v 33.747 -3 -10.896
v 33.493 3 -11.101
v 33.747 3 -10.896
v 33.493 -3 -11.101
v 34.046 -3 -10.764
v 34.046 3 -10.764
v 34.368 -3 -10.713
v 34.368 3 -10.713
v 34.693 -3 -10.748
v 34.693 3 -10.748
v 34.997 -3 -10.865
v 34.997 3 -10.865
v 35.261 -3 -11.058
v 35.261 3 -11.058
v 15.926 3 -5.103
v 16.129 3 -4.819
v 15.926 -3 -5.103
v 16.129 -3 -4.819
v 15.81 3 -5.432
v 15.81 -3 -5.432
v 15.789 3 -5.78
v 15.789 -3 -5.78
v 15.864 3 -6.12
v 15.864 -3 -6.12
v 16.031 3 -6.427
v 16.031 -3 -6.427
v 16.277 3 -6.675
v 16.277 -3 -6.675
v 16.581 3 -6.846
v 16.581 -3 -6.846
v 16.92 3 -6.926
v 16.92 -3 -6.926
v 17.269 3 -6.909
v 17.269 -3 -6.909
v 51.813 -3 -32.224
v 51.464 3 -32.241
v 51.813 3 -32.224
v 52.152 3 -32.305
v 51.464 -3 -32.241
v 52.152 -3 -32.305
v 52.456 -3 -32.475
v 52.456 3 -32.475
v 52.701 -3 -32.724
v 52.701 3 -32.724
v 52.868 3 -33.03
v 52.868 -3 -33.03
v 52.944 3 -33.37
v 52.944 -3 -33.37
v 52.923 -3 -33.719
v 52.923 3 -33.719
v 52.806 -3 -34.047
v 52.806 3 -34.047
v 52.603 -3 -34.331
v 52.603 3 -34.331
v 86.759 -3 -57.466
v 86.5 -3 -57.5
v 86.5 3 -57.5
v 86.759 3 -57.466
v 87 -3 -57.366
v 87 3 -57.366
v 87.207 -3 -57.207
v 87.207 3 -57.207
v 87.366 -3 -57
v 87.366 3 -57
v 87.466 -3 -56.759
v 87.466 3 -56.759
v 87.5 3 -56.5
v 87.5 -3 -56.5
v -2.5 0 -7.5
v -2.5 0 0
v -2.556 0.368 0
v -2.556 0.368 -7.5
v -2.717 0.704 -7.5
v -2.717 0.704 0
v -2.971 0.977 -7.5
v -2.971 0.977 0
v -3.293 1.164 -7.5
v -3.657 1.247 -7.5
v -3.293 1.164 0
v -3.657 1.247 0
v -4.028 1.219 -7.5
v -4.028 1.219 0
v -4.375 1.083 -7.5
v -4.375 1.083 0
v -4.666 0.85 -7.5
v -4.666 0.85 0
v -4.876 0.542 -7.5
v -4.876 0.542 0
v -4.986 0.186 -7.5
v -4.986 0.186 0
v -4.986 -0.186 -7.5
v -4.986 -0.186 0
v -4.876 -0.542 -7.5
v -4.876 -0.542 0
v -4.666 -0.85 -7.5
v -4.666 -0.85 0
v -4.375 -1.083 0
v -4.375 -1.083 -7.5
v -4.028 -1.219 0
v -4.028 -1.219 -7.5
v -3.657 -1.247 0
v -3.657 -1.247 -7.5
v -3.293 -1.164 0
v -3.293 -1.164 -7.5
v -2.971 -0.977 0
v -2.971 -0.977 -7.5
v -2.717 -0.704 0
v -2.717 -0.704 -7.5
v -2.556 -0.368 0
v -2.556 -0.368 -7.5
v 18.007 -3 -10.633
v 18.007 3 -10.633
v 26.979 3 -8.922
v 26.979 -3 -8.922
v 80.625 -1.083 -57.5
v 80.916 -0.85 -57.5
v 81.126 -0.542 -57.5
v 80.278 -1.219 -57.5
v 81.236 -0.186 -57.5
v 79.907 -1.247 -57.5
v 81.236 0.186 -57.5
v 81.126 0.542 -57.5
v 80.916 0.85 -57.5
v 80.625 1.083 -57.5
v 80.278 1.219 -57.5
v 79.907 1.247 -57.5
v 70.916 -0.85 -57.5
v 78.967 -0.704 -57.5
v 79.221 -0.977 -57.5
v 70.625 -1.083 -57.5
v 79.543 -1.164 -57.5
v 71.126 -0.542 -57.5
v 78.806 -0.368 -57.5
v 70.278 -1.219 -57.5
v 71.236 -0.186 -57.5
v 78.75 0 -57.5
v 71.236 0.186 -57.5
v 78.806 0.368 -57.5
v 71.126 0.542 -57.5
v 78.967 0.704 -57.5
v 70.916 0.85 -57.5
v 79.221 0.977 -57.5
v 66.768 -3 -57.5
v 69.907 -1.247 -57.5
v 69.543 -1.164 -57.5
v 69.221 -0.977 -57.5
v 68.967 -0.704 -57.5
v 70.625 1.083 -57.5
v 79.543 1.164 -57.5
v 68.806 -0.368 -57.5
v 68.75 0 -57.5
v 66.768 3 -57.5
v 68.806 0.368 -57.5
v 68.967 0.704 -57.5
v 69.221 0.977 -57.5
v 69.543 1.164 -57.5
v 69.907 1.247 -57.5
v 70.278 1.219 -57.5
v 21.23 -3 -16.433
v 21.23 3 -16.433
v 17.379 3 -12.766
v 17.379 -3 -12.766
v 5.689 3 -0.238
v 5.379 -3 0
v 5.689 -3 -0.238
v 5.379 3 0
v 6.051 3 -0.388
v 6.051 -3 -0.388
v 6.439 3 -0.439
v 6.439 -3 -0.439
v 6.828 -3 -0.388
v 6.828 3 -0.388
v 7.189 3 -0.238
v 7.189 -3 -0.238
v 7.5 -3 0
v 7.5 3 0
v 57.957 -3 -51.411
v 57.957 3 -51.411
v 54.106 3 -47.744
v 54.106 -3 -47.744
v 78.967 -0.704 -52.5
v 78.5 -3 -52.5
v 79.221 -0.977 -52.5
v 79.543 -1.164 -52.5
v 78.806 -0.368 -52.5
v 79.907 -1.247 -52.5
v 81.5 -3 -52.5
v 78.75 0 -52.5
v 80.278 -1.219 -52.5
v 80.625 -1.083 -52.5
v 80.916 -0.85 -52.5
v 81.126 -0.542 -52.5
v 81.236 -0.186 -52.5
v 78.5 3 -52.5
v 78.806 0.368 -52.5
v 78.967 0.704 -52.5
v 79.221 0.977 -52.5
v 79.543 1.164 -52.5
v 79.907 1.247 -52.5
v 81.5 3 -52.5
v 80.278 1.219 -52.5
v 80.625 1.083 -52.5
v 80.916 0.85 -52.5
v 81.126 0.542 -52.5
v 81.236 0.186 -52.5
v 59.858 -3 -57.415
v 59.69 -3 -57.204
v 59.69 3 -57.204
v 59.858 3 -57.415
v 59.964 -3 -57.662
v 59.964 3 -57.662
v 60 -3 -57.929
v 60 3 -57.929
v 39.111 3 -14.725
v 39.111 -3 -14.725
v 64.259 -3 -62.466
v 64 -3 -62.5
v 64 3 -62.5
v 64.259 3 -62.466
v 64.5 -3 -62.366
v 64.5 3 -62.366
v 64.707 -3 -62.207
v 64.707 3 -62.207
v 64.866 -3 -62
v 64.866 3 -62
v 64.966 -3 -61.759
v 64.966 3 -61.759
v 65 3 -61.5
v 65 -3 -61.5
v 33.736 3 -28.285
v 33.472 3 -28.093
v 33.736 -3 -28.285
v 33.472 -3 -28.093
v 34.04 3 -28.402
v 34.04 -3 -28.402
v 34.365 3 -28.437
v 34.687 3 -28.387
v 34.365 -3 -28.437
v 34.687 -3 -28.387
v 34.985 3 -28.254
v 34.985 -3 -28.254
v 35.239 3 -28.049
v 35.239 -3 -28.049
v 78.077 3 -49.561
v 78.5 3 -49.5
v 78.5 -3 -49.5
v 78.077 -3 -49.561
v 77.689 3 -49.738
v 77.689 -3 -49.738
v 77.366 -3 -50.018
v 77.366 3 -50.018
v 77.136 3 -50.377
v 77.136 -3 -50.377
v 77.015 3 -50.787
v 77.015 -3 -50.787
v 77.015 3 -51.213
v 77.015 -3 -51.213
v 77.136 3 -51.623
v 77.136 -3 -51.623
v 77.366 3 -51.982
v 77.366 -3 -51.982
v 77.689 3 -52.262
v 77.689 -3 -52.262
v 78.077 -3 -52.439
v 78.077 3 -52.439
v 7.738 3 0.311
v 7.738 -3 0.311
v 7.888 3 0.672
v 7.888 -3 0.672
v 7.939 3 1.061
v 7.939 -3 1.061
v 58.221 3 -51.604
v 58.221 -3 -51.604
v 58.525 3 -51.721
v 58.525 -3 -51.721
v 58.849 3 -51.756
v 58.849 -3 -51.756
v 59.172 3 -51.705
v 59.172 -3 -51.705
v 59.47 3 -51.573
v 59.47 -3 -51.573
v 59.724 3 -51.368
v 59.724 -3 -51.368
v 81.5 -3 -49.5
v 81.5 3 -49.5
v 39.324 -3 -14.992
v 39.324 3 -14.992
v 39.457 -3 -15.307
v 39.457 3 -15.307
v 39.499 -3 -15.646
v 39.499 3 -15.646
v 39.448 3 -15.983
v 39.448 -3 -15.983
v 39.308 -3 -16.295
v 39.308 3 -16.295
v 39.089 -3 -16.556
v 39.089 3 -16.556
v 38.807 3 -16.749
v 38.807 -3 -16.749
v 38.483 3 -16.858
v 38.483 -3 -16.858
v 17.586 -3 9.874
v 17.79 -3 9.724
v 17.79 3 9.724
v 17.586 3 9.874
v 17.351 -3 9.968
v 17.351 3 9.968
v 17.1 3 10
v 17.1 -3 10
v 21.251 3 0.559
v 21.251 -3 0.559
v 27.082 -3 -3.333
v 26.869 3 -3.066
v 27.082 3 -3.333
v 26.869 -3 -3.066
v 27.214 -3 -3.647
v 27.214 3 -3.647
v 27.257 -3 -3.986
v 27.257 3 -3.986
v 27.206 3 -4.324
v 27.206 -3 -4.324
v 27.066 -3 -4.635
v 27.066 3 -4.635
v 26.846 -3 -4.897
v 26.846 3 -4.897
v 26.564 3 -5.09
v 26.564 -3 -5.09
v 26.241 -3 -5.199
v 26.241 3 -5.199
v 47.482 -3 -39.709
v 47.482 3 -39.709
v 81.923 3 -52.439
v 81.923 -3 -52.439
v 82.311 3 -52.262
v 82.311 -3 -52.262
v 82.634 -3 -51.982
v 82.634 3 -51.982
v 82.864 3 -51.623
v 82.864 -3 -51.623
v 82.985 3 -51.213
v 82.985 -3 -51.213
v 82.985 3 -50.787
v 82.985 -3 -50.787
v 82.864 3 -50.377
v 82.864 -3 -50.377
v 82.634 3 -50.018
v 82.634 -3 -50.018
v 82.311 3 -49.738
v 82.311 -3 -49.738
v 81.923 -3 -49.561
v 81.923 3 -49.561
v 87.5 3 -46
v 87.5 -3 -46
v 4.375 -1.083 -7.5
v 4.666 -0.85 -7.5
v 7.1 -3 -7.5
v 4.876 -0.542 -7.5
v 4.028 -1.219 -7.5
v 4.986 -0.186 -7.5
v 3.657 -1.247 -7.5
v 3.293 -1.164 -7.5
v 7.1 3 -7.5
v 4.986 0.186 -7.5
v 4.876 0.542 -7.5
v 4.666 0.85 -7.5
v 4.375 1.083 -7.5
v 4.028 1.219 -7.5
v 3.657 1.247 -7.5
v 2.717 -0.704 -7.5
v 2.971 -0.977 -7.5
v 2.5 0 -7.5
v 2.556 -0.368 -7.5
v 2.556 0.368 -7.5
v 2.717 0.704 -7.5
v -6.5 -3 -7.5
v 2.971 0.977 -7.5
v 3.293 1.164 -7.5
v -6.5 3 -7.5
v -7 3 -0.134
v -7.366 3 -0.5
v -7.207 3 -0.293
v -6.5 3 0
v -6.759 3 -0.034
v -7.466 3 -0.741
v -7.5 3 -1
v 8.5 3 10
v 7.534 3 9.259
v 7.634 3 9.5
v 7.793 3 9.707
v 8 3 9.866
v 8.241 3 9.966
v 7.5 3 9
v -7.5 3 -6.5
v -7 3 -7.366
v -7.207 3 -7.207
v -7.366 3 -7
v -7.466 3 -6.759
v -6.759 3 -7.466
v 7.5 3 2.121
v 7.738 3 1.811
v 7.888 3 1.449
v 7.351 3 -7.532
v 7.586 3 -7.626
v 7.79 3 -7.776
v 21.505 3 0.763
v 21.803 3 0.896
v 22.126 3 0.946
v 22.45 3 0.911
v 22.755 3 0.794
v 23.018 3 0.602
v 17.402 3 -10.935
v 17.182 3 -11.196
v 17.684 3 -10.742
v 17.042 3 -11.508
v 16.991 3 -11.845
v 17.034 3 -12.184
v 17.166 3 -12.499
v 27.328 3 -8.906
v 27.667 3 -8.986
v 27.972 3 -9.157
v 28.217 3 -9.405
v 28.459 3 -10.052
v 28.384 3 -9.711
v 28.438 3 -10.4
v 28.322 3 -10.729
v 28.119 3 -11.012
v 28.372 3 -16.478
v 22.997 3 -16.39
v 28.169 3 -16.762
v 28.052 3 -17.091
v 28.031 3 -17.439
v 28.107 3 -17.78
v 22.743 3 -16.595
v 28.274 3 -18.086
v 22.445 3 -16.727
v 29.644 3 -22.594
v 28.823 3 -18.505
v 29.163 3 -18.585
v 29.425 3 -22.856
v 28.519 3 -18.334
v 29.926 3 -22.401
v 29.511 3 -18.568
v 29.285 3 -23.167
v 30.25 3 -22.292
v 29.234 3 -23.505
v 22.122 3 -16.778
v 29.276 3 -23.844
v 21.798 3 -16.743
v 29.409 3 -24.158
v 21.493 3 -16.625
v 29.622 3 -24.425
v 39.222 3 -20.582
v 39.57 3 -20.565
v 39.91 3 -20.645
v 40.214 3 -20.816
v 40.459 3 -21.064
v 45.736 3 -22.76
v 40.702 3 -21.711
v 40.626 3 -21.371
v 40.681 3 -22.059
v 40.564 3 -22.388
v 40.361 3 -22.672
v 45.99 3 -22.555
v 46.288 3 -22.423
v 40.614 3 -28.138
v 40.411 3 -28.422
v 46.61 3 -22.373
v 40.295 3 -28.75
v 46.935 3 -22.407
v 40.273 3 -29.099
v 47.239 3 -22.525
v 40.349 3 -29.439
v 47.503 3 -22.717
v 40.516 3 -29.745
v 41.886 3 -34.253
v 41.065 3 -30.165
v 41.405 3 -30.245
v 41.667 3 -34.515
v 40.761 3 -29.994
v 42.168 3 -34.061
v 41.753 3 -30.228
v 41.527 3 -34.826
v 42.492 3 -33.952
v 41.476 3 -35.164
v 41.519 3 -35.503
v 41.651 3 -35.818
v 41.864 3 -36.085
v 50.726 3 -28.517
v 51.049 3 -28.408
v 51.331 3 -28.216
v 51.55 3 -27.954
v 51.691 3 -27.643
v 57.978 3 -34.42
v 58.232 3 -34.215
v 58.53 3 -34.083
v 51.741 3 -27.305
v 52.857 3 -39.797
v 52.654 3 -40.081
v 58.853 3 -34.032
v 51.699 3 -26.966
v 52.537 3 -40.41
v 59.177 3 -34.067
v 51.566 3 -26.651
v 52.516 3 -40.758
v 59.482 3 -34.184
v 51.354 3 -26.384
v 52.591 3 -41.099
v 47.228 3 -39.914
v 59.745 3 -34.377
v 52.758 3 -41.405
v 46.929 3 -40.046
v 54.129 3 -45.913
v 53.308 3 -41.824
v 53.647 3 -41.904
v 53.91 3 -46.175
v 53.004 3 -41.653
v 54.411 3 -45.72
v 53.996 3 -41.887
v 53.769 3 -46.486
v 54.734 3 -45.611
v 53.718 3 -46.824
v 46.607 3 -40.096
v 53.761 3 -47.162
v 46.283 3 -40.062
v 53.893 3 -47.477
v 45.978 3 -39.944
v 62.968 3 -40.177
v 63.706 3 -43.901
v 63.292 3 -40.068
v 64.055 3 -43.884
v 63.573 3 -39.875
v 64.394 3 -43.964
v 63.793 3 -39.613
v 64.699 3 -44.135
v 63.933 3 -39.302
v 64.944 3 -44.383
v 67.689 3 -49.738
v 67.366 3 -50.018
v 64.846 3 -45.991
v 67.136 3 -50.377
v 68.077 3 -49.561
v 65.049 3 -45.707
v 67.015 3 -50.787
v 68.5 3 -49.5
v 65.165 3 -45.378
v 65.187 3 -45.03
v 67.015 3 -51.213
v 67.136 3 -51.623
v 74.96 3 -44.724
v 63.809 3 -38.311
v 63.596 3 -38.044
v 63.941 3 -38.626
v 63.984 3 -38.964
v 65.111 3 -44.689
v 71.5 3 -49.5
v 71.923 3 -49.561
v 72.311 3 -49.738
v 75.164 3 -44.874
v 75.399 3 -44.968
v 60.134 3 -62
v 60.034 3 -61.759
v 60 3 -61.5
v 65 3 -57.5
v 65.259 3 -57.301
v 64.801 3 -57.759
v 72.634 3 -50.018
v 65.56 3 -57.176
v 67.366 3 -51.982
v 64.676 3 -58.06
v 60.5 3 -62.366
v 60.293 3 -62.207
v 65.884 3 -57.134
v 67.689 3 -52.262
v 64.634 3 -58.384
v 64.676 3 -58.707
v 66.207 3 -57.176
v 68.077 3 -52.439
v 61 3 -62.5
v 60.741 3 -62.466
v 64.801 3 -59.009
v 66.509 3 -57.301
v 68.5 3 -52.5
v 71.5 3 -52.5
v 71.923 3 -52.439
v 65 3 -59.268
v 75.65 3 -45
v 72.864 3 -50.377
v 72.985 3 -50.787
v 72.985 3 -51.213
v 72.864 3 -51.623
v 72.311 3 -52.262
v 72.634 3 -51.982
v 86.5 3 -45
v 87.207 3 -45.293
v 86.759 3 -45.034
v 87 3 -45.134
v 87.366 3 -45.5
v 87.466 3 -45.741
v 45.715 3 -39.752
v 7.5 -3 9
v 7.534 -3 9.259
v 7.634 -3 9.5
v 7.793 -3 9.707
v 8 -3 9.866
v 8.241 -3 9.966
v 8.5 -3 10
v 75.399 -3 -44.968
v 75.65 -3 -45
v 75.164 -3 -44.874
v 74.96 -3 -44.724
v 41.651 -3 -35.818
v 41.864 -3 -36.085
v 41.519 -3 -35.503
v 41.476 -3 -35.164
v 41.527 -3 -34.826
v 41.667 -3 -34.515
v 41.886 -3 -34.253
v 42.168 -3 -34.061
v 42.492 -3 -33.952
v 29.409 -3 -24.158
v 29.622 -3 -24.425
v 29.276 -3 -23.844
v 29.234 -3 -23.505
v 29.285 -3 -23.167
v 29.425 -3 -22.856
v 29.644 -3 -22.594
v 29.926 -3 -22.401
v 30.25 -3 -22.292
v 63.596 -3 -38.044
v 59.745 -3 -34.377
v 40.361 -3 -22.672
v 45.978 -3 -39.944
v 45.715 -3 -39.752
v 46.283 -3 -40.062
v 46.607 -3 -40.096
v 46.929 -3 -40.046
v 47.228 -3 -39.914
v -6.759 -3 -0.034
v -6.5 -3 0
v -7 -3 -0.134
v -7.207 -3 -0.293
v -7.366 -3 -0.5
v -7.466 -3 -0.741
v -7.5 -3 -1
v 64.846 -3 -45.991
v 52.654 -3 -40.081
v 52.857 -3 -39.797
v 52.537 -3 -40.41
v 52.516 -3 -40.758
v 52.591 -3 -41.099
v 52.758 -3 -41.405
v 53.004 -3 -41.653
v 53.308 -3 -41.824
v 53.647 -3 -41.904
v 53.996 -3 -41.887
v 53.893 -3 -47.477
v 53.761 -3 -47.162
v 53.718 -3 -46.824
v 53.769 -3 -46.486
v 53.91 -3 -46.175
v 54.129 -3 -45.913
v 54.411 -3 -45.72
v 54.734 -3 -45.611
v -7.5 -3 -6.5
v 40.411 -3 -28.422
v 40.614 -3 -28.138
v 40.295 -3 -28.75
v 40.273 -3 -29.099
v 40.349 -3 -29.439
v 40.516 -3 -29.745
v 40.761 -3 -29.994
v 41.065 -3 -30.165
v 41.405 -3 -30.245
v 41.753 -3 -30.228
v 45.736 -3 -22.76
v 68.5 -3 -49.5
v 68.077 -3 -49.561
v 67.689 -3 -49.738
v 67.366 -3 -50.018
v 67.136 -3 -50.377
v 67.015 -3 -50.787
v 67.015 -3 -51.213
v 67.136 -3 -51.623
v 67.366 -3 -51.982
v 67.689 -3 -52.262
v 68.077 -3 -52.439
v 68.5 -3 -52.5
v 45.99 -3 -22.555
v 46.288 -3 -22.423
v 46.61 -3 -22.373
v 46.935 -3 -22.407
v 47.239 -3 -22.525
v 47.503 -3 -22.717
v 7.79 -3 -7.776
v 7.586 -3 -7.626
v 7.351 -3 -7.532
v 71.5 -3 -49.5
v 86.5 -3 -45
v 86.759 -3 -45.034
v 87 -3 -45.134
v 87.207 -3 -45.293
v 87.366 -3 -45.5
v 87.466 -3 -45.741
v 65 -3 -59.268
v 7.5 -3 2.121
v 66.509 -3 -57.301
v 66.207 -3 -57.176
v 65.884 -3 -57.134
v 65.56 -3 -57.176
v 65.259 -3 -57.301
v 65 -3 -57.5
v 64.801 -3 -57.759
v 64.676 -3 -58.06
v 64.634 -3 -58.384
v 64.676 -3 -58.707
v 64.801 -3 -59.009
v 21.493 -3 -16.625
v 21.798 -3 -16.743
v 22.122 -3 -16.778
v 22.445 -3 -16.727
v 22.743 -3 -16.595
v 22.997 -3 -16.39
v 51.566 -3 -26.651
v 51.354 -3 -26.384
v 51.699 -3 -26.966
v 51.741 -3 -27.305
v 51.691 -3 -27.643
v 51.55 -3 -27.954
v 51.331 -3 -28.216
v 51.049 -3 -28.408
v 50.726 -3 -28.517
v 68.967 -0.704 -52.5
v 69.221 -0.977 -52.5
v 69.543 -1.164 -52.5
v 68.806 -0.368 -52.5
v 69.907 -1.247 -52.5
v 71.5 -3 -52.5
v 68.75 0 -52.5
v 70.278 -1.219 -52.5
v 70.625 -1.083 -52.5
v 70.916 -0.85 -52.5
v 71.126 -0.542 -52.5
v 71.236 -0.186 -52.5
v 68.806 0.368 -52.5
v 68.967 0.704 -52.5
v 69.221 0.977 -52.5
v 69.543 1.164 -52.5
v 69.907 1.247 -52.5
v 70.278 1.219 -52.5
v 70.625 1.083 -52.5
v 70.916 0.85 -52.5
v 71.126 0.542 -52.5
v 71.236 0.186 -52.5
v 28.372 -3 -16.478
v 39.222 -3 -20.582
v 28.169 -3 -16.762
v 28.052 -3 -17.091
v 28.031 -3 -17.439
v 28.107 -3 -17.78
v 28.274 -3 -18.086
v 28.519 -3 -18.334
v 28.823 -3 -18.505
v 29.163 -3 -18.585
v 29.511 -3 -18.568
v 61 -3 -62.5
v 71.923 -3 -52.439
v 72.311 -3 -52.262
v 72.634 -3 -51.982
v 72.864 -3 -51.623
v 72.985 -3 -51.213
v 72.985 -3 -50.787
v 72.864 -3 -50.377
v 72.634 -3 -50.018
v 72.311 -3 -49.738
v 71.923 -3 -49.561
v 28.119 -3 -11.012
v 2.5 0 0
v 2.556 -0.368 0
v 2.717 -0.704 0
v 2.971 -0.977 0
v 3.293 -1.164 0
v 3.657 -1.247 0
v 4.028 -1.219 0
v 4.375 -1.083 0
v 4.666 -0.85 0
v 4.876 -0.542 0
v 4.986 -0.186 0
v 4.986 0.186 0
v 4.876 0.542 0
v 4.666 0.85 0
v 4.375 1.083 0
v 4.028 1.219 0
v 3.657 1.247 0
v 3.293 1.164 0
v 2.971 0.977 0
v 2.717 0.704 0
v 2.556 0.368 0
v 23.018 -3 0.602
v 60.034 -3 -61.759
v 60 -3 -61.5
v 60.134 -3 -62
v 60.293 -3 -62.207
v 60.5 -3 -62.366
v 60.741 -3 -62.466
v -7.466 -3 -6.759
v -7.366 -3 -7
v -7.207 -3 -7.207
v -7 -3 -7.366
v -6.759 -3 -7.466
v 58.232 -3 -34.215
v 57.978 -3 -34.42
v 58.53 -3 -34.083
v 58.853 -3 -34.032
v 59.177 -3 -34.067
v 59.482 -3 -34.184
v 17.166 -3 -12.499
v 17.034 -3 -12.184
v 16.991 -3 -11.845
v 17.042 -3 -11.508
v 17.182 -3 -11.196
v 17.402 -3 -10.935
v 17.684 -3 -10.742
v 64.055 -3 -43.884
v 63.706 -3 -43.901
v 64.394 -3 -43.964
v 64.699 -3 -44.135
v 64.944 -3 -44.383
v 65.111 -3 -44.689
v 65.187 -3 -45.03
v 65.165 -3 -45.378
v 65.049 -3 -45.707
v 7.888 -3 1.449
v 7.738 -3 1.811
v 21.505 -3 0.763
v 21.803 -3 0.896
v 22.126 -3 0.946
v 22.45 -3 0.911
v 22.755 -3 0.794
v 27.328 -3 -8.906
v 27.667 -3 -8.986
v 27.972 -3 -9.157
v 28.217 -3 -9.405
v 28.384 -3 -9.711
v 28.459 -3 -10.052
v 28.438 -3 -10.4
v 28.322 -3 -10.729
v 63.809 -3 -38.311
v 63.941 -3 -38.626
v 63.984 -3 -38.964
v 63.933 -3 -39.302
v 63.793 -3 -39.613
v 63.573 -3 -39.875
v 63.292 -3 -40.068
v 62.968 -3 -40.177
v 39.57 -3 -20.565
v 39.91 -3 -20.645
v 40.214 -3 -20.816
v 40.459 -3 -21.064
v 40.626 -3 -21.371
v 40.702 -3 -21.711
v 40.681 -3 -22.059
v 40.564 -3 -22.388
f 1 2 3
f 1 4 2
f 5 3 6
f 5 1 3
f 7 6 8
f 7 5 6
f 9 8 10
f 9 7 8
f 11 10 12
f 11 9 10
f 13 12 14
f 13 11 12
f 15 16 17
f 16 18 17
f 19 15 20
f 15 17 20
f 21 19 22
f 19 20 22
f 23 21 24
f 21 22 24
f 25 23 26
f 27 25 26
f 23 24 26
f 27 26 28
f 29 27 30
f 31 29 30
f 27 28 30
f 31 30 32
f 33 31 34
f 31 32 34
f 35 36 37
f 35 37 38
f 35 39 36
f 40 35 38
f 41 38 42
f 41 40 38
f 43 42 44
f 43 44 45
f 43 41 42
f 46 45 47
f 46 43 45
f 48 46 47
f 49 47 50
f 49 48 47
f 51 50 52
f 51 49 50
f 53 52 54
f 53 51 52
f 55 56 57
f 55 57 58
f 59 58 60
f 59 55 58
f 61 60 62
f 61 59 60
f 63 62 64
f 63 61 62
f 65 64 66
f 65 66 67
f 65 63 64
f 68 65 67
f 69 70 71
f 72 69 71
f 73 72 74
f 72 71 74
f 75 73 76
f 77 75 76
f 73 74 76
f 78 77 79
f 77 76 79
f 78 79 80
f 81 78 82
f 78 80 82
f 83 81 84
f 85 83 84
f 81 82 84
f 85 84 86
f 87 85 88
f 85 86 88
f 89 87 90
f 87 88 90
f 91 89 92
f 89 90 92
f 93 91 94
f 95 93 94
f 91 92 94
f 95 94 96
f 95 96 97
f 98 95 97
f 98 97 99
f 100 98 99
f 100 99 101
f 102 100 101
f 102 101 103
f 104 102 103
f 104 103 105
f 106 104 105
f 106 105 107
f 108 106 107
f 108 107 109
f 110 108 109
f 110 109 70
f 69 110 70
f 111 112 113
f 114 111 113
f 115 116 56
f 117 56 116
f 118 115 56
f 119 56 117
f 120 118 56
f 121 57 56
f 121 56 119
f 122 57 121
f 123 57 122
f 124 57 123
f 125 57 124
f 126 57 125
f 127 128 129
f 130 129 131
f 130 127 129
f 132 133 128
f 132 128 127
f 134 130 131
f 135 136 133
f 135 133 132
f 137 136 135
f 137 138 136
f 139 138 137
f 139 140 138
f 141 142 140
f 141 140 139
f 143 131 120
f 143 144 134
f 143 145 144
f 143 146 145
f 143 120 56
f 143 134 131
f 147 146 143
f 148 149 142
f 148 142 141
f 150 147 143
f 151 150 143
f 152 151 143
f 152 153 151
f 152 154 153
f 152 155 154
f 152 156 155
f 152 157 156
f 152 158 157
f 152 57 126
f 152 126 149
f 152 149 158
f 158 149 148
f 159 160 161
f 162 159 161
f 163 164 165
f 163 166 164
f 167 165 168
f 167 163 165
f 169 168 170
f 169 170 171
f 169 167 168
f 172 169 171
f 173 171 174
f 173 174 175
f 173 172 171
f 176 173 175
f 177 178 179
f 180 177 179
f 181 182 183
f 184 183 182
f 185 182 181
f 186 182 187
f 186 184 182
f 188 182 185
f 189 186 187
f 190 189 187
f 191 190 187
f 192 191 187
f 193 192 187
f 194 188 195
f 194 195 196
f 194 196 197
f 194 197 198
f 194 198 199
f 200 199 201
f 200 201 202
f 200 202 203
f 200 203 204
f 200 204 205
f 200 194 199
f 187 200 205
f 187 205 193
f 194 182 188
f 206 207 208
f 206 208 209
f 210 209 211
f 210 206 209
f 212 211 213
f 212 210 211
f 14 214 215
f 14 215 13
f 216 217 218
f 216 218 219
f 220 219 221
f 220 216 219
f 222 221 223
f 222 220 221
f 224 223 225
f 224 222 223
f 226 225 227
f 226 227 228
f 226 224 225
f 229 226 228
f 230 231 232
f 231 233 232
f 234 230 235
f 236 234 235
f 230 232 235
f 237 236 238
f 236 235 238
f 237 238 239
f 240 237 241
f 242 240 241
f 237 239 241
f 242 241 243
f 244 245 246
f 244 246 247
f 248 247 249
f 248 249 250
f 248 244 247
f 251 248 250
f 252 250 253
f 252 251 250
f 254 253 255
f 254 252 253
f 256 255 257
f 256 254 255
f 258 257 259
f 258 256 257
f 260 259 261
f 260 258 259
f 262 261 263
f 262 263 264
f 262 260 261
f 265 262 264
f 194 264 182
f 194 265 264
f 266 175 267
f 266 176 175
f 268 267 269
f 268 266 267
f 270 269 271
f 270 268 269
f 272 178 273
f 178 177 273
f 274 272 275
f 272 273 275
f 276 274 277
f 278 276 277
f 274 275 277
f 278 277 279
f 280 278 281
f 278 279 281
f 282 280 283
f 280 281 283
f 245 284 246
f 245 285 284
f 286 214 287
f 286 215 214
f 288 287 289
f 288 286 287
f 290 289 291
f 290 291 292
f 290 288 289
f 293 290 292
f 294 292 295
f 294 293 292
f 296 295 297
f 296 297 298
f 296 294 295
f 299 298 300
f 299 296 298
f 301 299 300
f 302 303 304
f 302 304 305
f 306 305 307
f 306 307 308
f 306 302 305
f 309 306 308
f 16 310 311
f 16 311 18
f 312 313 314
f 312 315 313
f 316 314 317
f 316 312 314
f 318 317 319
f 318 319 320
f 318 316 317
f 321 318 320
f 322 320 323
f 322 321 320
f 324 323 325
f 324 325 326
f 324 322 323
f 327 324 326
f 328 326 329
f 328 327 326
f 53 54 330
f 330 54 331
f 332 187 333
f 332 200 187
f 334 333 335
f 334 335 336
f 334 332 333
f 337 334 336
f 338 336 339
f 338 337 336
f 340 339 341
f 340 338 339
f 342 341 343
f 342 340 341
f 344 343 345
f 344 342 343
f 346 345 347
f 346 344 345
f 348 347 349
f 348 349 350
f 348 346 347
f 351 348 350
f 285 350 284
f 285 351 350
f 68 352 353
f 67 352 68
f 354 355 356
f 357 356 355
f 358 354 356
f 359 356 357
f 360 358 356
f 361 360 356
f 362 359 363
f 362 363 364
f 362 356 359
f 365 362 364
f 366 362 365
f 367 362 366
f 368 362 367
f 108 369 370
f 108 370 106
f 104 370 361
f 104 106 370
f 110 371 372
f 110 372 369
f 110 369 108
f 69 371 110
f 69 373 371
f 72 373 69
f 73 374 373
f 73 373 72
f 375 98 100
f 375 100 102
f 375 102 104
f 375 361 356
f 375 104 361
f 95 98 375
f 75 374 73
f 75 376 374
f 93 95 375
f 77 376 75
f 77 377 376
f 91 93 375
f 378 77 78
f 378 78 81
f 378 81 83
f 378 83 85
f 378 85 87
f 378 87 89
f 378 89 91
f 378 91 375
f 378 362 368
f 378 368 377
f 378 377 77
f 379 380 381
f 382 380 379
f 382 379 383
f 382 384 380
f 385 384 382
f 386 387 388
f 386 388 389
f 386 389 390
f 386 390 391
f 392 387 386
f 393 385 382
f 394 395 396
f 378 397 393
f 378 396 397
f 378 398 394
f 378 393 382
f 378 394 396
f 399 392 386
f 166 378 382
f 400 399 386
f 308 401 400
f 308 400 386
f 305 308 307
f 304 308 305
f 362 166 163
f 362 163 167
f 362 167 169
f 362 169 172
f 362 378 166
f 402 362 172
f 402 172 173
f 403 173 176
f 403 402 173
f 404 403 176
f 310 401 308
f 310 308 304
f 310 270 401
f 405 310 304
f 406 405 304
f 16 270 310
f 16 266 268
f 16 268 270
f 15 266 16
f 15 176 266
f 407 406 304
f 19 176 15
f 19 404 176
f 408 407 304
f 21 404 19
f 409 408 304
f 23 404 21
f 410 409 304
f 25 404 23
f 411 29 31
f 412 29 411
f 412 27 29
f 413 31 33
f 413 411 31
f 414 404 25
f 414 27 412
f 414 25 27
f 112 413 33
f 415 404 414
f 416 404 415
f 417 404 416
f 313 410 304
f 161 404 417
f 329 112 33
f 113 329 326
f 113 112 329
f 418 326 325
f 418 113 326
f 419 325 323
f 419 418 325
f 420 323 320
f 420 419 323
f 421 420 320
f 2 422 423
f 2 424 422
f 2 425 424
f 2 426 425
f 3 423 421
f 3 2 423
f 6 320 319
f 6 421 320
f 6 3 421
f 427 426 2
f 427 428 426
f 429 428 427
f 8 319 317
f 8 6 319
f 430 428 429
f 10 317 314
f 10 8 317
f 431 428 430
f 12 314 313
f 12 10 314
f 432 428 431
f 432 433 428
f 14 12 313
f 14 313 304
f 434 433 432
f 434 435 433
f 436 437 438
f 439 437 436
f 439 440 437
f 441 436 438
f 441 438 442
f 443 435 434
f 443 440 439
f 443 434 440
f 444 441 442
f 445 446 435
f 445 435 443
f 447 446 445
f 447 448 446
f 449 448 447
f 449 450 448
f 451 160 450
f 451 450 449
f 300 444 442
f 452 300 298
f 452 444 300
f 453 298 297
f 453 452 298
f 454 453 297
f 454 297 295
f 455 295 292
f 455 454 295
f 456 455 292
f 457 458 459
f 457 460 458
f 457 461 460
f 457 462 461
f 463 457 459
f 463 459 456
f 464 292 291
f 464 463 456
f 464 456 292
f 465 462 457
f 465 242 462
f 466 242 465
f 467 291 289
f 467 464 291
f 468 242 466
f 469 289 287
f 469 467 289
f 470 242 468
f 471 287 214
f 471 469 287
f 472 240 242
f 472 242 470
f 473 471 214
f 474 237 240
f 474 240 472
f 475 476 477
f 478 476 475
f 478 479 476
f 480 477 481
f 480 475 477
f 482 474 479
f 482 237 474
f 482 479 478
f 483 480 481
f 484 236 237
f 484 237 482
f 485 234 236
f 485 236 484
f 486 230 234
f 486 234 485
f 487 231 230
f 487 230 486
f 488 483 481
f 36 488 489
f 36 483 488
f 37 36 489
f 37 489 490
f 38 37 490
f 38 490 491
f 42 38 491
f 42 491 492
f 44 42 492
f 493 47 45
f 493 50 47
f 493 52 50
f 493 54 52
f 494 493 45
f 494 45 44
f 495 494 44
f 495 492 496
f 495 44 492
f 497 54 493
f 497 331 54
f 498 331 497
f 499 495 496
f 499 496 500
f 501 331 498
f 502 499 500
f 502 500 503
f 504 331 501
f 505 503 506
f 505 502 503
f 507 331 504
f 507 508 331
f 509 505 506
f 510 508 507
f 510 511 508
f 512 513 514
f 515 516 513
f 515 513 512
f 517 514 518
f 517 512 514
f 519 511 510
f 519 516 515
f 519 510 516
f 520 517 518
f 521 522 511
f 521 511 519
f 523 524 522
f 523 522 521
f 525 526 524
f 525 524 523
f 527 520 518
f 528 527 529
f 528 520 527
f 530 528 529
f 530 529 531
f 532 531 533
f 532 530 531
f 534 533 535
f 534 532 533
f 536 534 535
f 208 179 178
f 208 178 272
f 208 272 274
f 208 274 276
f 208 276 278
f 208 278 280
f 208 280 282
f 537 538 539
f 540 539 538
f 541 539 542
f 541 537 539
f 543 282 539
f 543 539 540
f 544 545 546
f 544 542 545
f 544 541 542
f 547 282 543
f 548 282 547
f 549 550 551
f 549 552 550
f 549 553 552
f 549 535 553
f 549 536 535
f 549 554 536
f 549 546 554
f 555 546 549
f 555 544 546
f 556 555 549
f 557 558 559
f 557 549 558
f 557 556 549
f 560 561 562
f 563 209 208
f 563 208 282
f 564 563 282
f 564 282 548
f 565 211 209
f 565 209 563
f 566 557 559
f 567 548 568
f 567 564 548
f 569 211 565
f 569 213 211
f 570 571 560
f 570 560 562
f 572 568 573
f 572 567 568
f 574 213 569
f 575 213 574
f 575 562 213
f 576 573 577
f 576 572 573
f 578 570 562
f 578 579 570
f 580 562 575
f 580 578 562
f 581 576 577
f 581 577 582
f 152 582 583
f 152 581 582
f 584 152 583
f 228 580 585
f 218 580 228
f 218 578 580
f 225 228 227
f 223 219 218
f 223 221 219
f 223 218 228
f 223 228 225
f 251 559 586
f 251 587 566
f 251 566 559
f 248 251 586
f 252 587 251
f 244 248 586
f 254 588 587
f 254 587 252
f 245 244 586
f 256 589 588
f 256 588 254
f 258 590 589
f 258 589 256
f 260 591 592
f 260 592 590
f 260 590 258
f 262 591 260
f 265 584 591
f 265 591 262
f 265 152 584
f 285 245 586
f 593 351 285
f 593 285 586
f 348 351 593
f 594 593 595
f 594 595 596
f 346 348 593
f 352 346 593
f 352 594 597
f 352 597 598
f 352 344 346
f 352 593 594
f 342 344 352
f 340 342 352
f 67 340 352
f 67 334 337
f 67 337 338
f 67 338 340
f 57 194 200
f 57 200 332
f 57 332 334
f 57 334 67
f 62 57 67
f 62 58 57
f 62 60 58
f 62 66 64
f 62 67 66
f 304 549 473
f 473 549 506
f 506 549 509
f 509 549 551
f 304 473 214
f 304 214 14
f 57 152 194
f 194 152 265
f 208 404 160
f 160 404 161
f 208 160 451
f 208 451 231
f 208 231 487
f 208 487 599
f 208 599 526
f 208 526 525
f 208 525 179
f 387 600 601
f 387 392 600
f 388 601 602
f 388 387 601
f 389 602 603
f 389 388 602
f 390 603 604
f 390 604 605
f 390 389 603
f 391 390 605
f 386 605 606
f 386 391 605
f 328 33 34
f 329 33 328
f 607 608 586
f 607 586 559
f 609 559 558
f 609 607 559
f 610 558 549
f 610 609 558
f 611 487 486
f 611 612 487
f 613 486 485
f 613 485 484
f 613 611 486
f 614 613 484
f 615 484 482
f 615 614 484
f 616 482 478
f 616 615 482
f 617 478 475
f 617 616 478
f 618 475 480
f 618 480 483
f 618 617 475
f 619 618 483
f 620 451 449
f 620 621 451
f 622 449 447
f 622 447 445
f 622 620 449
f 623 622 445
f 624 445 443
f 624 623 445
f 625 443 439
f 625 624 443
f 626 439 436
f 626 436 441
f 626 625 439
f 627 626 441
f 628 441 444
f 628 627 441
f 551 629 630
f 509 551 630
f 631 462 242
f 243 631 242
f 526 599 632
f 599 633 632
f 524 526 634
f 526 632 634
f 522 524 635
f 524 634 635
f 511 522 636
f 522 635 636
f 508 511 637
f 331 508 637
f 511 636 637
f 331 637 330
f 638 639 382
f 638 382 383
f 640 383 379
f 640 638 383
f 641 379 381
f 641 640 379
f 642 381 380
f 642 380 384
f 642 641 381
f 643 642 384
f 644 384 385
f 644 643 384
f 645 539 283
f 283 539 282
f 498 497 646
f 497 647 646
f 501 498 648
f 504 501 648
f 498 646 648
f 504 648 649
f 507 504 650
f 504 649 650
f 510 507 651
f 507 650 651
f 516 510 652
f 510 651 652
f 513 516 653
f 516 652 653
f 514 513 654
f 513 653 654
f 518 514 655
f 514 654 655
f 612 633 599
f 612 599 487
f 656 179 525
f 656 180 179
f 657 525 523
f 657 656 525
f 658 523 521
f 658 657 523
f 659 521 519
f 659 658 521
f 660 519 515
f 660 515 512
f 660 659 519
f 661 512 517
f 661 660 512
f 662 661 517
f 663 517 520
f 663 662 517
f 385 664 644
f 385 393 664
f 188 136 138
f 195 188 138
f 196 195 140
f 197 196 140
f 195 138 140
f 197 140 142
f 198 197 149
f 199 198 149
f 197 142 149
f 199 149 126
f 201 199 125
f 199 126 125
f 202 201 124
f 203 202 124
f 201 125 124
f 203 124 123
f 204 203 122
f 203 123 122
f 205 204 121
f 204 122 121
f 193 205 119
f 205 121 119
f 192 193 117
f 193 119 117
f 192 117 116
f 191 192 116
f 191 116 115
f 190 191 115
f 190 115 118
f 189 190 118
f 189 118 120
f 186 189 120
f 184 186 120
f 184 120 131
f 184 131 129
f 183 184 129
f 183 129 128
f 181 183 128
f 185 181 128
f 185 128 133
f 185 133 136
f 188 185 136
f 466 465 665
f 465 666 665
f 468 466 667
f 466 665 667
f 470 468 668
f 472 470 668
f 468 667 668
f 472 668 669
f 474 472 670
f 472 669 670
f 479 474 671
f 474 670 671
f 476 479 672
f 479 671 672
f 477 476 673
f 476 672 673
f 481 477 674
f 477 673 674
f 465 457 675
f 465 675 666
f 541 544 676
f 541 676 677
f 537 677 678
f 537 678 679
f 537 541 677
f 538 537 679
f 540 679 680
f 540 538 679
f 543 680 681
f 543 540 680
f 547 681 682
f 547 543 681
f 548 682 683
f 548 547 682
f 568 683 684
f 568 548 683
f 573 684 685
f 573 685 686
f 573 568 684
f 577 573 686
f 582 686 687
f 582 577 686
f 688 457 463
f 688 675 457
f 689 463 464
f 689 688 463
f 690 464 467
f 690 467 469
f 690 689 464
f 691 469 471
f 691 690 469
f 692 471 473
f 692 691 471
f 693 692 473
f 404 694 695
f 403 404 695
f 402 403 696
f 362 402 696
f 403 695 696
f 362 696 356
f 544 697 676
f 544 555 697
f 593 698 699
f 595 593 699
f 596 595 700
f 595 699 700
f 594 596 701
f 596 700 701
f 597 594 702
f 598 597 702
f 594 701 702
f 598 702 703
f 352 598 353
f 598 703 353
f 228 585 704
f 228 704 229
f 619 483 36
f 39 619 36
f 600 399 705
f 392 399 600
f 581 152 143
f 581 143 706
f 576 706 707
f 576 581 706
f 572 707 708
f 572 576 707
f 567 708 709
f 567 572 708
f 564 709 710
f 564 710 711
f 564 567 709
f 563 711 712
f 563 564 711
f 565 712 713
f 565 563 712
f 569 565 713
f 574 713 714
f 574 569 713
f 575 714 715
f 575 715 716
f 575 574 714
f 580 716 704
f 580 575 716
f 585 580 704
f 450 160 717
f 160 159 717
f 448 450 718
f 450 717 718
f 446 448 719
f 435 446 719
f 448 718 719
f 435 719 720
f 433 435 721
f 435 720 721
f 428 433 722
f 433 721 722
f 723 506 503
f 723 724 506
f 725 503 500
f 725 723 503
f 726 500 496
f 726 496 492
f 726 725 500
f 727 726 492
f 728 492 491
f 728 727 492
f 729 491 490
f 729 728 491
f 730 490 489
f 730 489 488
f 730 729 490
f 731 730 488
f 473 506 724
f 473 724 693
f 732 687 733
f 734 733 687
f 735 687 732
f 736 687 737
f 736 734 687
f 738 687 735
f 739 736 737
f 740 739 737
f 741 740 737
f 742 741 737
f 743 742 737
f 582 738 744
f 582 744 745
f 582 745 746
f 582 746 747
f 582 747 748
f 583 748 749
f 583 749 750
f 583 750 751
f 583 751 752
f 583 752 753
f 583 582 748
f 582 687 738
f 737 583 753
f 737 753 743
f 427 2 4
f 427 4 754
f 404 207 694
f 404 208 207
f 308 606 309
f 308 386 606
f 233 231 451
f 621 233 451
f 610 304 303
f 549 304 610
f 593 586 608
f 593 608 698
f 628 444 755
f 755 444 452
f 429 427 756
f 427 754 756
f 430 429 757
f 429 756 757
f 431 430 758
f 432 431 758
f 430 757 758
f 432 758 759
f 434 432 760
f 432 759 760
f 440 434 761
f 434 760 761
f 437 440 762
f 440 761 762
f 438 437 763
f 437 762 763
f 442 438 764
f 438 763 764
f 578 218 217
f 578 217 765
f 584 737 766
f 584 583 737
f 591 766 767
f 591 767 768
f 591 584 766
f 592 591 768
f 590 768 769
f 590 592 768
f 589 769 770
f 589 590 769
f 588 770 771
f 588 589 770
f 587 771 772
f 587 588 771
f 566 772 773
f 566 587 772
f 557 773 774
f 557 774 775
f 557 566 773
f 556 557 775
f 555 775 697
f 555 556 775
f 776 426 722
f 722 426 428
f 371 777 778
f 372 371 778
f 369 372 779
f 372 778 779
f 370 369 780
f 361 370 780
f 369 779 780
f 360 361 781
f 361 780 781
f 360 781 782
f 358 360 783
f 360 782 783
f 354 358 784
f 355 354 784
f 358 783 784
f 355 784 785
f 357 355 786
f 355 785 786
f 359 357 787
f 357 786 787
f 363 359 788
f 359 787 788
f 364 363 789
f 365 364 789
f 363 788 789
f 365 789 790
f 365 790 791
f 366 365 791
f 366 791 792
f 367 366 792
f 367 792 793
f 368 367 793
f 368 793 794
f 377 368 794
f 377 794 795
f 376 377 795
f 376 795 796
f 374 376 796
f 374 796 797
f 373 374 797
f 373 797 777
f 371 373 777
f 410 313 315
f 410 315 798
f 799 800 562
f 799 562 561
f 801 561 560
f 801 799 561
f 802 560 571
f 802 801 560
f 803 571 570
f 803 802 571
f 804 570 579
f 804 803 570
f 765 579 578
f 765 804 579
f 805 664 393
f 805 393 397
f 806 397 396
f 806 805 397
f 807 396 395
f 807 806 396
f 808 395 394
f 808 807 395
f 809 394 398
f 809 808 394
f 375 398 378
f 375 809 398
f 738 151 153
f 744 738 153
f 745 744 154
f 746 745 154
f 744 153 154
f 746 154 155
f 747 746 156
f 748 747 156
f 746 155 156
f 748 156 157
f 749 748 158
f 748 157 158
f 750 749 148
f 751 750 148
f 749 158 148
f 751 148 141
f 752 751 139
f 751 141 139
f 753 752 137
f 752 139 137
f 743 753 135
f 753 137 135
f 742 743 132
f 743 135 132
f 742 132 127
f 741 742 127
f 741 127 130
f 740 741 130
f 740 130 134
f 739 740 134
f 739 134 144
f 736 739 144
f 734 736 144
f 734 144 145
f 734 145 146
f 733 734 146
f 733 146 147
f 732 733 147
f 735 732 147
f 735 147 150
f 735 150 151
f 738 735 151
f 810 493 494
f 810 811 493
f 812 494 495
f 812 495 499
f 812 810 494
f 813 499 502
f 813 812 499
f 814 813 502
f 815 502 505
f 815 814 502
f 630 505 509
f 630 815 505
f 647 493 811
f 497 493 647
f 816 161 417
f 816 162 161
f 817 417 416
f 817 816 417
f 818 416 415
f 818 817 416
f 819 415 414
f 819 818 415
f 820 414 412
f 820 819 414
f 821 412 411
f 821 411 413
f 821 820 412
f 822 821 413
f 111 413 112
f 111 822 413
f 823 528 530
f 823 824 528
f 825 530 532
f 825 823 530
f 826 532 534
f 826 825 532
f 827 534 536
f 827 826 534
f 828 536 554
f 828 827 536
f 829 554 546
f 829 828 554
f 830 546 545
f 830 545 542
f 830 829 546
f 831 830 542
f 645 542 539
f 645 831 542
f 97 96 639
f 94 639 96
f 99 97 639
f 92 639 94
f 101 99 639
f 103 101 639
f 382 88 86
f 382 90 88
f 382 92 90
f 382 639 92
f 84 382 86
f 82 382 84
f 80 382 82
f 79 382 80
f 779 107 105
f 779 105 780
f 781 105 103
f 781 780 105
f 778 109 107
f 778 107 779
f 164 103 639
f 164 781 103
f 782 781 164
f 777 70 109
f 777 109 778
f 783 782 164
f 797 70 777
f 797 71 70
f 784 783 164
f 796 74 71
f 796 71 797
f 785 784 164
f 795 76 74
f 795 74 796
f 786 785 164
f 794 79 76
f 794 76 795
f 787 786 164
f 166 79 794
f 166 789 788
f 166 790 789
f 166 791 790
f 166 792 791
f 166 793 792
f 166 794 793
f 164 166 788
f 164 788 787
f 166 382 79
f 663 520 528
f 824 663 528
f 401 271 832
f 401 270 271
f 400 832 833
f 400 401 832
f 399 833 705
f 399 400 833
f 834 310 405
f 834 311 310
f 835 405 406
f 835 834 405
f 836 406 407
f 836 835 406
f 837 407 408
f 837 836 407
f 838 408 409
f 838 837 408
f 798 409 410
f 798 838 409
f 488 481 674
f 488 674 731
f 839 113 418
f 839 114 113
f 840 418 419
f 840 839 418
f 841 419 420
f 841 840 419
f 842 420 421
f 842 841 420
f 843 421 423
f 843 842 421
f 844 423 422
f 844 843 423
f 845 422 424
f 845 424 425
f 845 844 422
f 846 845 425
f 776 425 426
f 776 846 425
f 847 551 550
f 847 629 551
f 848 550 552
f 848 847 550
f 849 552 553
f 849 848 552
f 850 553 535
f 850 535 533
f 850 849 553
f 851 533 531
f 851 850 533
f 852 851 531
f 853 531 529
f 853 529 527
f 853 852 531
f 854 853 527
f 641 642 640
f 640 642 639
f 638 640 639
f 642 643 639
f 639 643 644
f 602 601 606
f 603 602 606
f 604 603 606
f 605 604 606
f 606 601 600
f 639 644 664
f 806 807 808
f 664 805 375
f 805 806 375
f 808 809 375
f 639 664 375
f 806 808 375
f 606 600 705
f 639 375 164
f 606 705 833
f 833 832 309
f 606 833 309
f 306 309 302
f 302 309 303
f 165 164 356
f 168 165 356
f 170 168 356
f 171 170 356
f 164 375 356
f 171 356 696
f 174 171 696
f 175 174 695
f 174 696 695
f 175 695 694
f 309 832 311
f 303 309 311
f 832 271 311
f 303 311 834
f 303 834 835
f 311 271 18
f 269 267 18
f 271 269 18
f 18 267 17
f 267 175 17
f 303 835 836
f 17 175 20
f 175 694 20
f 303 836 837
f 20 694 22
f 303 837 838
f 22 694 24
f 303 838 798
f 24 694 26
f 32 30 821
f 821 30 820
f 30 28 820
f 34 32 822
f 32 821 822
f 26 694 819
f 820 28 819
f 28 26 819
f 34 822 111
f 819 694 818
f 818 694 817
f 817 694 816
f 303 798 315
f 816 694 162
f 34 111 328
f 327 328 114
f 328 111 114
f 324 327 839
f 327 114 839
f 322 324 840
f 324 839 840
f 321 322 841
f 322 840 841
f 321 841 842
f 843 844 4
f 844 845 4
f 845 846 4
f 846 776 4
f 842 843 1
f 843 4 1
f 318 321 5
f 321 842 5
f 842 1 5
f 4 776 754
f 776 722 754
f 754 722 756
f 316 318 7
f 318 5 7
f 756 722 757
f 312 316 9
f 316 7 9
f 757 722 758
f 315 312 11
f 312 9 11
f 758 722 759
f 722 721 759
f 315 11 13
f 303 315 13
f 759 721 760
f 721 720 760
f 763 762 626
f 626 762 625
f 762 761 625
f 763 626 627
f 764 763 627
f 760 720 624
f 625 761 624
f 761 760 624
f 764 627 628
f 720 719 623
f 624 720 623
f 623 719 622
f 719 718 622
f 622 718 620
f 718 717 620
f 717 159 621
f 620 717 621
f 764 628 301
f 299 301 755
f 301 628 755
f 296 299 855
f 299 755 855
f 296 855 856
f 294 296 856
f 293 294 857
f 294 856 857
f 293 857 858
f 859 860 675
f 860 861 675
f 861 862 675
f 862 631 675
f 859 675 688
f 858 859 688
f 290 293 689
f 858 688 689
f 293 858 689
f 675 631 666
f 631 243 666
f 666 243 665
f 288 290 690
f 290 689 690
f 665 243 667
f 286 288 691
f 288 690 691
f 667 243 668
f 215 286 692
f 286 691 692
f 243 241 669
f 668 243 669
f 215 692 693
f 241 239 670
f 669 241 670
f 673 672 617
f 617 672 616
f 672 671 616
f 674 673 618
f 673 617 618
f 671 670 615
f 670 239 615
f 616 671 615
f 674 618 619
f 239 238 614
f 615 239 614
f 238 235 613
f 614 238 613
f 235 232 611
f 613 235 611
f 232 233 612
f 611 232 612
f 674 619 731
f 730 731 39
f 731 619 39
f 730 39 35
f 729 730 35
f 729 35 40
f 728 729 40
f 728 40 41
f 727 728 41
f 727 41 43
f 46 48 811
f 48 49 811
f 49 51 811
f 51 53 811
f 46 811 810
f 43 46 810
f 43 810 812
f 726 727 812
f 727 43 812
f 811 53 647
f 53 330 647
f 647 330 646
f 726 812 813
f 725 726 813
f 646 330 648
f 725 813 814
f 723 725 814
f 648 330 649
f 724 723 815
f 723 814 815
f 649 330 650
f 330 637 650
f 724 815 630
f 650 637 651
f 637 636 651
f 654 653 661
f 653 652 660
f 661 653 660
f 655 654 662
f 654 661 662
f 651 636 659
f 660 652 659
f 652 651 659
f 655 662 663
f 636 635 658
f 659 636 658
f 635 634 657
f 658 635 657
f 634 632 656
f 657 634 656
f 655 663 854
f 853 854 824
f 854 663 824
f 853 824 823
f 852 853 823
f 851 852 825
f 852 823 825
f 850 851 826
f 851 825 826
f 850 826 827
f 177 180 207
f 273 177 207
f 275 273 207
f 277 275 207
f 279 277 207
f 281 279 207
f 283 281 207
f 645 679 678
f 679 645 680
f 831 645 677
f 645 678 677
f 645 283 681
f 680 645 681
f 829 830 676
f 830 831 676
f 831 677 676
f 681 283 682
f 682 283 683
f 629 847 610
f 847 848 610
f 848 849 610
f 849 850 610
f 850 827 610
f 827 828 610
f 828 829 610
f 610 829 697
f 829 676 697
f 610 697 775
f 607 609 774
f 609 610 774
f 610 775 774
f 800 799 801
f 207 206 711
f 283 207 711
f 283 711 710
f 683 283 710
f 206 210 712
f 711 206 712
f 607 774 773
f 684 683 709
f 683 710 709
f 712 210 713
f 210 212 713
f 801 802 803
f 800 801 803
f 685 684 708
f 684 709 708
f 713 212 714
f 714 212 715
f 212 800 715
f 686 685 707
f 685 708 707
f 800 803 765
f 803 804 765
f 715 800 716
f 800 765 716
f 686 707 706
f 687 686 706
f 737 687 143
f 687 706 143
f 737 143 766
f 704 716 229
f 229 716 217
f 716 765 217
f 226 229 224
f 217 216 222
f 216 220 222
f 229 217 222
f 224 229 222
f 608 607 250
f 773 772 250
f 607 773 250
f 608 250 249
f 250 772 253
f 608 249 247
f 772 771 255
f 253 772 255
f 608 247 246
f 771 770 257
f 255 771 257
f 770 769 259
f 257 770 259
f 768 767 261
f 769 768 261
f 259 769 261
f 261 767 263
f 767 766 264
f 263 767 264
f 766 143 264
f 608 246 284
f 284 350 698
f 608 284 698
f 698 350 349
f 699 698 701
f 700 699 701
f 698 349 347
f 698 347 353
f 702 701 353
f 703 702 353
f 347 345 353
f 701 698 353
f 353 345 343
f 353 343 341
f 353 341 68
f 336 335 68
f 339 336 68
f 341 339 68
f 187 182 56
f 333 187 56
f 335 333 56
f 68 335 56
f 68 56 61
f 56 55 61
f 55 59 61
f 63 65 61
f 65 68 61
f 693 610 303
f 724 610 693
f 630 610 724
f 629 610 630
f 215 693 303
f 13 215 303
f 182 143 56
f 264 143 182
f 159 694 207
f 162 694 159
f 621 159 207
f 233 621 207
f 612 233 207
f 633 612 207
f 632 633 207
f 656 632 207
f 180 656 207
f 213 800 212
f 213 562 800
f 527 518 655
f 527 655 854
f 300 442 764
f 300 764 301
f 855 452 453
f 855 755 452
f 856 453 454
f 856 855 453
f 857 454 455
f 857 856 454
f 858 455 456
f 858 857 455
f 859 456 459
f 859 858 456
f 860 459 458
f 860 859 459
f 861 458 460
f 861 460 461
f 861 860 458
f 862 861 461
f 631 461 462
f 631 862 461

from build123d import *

# Parameters (mm, degrees)
EXTRUDE_1_DEPTH     = 3
FILLET_2_R          = 1
CUT_EXTRUDE_1_DEPTH = 6
FILLET_3_R          = 1.25
SKETCH_6_R          = 1.25
CUT_EXTRUDE_4_DEPTH = 108.570906848
SKETCH_7_R          = 1.25
CUT_EXTRUDE_5_DEPTH = 8


with BuildPart() as part:
    # ｽｹｯﾁ1 → ﾎﾞｽ - 押し出し1 (new, symmetric)
    with BuildSketch(Plane(origin=(0, 0, 0), x_dir=(1, 0, 0), z_dir=(0, 1, 0))):
        with BuildLine():
            Line((7.5, -2.121320344), (7.5, -10))
            Line((7.5, -10), (17.5, -10))
            Line((17.5, -10), (75.25, 45))
            Line((75.25, 45), (87.5, 45))
            Line((87.5, 45), (87.5, 57.5))
            Line((87.5, 57.5), (66.767766953, 57.5))
            ThreePointArc((66.767766953, 57.5), (65.883883476, 57.133883476), (65, 57.5))
            ThreePointArc((65, 57.5), (64.633883476, 58.383883476), (65, 59.267766953))
            Line((65, 59.267766953), (65, 62.5))
            Line((65, 62.5), (60, 62.5))
            Line((60, 62.5), (60, 57.5))
            Line((60, 57.5), (7.5, 7.5))
            Line((7.5, 7.5), (-7.5, 7.5))
            Line((-7.5, 7.5), (-7.5, 0))
            Line((-7.5, 0), (5.378679656, 0))
            ThreePointArc((5.378679656, 0), (6.439339828, 0.439339828), (7.5, 0))
            ThreePointArc((7.5, 0), (7.825159127, -0.486635023), (7.939339828, -1.060660172))
            ThreePointArc((7.939339828, -1.060660172), (7.825159127, -1.63468532), (7.5, -2.121320344))
        make_face()
        with BuildLine():
            ThreePointArc((68.5, 49.5), (67, 51), (68.5, 52.5))
            Line((68.5, 52.5), (71.5, 52.5))
            ThreePointArc((71.5, 52.5), (73, 51), (71.5, 49.5))
            Line((71.5, 49.5), (68.5, 49.5))
        make_face(mode=Mode.SUBTRACT)
        with BuildLine():
            ThreePointArc((78.5, 49.5), (77, 51), (78.5, 52.5))
            Line((78.5, 52.5), (81.5, 52.5))
            ThreePointArc((81.5, 52.5), (83, 51), (81.5, 49.5))
            Line((81.5, 49.5), (78.5, 49.5))
        make_face(mode=Mode.SUBTRACT)
    extrude(amount=EXTRUDE_1_DEPTH, both=True)

    # ﾌｨﾚｯﾄ2
    fillet_2_edges = [part.edges().sort_by_distance(p)[0] for p in [
        (87.5, -1.5, -57.5),
        (87.5, -1.5, -45),
        (75.25, -1.5, -45),
        (17.5, -1.5, 10),
        (7.5, -1.5, 10),
        (-7.5, -1.5, 0),
        (-7.5, -1.5, -7.5),
        (7.5, -1.5, -7.5),
        (60, -1.5, -57.5),
        (60, -1.5, -62.5),
        (65, -1.5, -62.5),
    ]]
    fillet(fillet_2_edges, radius=FILLET_2_R)

    # ｽｹｯﾁ2 → ｶｯﾄ - 押し出し1 (cut)
    with BuildSketch(Plane(origin=(0, 3, 0), x_dir=(1, 0, 0), z_dir=(0, 1, 0))):
        Polygon((58.862068966, 52.273399015), (52.344827586, 46.066502463), (67.530321046, 43.17173433), align=None)
        Polygon((50.171921182, 42.616115412), (65.357414642, 39.721347279), (58.840173263, 33.514450727), align=None)
        Polygon((46.619704433, 40.614004222), (40.102463054, 34.407107671), (55.287956514, 31.512339537), align=None)
        Polygon((37.92955665, 30.956720619), (53.11505011, 28.061952486), (46.597808731, 21.855055934), align=None)
        Polygon((34.377339901, 28.95460943), (27.860098522, 22.747712878), (43.045591982, 19.852944745), align=None)
        Polygon((25.687192118, 19.297325827), (40.872685578, 16.402557694), (34.355444199, 10.195661142), align=None)
        Polygon((22.134975369, 17.295214638), (15.61773399, 11.088318086), (30.80322745, 8.193549953), align=None)
        Polygon((13.444827586, 7.637931034), (28.630321046, 4.743162901), (22.113079667, -1.46373365), align=None)
    extrude(amount=-CUT_EXTRUDE_1_DEPTH, mode=Mode.SUBTRACT)

    # ﾌｨﾚｯﾄ3
    fillet_3_edges = [part.edges().sort_by_distance(p)[0] for p in [
        (58.862068966, 0, -52.273399015),
        (67.530321046, 0, -43.17173433),
        (52.344827586, 0, -46.066502463),
        (46.619704433, 0, -40.614004222),
        (55.287956514, 0, -31.512339537),
        (40.102463054, 0, -34.407107671),
        (58.840173263, 0, -33.514450727),
        (50.171921182, 0, -42.616115412),
        (65.357414642, 0, -39.721347279),
        (34.377339901, 0, -28.95460943),
        (43.045591982, 0, -19.852944745),
        (27.860098522, 0, -22.747712878),
        (46.597808731, 0, -21.855055934),
        (37.92955665, 0, -30.956720619),
        (53.11505011, 0, -28.061952486),
        (22.134975369, 0, -17.295214638),
        (30.80322745, 0, -8.193549953),
        (15.61773399, 0, -11.088318086),
        (34.355444199, 0, -10.195661142),
        (25.687192118, 0, -19.297325827),
        (40.872685578, 0, -16.402557694),
        (22.113079667, 0, 1.46373365),
        (13.444827586, 0, -7.637931034),
        (28.630321046, 0, -4.743162901),
    ]]
    fillet(fillet_3_edges, radius=FILLET_3_R)

    # ｽｹｯﾁ6 → ｶｯﾄ - 押し出し4 (cut, through all)
    with BuildSketch(Plane.XY):
        with Locations((-3.75, 0)):
            Circle(SKETCH_6_R)
        with Locations(Location((3.75, 0, 0), (0, 0, 180))):
            Circle(SKETCH_6_R)
    extrude(amount=-CUT_EXTRUDE_4_DEPTH, mode=Mode.SUBTRACT)

    # ｽｹｯﾁ7 → ｶｯﾄ - 押し出し5 (cut)
    with BuildSketch(Plane(origin=(0, 0, -57.5), x_dir=(-1, 0, 0), z_dir=(0, 0, -1))):
        with Locations((-70, 0)):
            Circle(SKETCH_7_R)
        with Locations((-80, 0)):
            Circle(SKETCH_7_R)
    extrude(amount=-CUT_EXTRUDE_5_DEPTH, mode=Mode.SUBTRACT)


solid = part.part
